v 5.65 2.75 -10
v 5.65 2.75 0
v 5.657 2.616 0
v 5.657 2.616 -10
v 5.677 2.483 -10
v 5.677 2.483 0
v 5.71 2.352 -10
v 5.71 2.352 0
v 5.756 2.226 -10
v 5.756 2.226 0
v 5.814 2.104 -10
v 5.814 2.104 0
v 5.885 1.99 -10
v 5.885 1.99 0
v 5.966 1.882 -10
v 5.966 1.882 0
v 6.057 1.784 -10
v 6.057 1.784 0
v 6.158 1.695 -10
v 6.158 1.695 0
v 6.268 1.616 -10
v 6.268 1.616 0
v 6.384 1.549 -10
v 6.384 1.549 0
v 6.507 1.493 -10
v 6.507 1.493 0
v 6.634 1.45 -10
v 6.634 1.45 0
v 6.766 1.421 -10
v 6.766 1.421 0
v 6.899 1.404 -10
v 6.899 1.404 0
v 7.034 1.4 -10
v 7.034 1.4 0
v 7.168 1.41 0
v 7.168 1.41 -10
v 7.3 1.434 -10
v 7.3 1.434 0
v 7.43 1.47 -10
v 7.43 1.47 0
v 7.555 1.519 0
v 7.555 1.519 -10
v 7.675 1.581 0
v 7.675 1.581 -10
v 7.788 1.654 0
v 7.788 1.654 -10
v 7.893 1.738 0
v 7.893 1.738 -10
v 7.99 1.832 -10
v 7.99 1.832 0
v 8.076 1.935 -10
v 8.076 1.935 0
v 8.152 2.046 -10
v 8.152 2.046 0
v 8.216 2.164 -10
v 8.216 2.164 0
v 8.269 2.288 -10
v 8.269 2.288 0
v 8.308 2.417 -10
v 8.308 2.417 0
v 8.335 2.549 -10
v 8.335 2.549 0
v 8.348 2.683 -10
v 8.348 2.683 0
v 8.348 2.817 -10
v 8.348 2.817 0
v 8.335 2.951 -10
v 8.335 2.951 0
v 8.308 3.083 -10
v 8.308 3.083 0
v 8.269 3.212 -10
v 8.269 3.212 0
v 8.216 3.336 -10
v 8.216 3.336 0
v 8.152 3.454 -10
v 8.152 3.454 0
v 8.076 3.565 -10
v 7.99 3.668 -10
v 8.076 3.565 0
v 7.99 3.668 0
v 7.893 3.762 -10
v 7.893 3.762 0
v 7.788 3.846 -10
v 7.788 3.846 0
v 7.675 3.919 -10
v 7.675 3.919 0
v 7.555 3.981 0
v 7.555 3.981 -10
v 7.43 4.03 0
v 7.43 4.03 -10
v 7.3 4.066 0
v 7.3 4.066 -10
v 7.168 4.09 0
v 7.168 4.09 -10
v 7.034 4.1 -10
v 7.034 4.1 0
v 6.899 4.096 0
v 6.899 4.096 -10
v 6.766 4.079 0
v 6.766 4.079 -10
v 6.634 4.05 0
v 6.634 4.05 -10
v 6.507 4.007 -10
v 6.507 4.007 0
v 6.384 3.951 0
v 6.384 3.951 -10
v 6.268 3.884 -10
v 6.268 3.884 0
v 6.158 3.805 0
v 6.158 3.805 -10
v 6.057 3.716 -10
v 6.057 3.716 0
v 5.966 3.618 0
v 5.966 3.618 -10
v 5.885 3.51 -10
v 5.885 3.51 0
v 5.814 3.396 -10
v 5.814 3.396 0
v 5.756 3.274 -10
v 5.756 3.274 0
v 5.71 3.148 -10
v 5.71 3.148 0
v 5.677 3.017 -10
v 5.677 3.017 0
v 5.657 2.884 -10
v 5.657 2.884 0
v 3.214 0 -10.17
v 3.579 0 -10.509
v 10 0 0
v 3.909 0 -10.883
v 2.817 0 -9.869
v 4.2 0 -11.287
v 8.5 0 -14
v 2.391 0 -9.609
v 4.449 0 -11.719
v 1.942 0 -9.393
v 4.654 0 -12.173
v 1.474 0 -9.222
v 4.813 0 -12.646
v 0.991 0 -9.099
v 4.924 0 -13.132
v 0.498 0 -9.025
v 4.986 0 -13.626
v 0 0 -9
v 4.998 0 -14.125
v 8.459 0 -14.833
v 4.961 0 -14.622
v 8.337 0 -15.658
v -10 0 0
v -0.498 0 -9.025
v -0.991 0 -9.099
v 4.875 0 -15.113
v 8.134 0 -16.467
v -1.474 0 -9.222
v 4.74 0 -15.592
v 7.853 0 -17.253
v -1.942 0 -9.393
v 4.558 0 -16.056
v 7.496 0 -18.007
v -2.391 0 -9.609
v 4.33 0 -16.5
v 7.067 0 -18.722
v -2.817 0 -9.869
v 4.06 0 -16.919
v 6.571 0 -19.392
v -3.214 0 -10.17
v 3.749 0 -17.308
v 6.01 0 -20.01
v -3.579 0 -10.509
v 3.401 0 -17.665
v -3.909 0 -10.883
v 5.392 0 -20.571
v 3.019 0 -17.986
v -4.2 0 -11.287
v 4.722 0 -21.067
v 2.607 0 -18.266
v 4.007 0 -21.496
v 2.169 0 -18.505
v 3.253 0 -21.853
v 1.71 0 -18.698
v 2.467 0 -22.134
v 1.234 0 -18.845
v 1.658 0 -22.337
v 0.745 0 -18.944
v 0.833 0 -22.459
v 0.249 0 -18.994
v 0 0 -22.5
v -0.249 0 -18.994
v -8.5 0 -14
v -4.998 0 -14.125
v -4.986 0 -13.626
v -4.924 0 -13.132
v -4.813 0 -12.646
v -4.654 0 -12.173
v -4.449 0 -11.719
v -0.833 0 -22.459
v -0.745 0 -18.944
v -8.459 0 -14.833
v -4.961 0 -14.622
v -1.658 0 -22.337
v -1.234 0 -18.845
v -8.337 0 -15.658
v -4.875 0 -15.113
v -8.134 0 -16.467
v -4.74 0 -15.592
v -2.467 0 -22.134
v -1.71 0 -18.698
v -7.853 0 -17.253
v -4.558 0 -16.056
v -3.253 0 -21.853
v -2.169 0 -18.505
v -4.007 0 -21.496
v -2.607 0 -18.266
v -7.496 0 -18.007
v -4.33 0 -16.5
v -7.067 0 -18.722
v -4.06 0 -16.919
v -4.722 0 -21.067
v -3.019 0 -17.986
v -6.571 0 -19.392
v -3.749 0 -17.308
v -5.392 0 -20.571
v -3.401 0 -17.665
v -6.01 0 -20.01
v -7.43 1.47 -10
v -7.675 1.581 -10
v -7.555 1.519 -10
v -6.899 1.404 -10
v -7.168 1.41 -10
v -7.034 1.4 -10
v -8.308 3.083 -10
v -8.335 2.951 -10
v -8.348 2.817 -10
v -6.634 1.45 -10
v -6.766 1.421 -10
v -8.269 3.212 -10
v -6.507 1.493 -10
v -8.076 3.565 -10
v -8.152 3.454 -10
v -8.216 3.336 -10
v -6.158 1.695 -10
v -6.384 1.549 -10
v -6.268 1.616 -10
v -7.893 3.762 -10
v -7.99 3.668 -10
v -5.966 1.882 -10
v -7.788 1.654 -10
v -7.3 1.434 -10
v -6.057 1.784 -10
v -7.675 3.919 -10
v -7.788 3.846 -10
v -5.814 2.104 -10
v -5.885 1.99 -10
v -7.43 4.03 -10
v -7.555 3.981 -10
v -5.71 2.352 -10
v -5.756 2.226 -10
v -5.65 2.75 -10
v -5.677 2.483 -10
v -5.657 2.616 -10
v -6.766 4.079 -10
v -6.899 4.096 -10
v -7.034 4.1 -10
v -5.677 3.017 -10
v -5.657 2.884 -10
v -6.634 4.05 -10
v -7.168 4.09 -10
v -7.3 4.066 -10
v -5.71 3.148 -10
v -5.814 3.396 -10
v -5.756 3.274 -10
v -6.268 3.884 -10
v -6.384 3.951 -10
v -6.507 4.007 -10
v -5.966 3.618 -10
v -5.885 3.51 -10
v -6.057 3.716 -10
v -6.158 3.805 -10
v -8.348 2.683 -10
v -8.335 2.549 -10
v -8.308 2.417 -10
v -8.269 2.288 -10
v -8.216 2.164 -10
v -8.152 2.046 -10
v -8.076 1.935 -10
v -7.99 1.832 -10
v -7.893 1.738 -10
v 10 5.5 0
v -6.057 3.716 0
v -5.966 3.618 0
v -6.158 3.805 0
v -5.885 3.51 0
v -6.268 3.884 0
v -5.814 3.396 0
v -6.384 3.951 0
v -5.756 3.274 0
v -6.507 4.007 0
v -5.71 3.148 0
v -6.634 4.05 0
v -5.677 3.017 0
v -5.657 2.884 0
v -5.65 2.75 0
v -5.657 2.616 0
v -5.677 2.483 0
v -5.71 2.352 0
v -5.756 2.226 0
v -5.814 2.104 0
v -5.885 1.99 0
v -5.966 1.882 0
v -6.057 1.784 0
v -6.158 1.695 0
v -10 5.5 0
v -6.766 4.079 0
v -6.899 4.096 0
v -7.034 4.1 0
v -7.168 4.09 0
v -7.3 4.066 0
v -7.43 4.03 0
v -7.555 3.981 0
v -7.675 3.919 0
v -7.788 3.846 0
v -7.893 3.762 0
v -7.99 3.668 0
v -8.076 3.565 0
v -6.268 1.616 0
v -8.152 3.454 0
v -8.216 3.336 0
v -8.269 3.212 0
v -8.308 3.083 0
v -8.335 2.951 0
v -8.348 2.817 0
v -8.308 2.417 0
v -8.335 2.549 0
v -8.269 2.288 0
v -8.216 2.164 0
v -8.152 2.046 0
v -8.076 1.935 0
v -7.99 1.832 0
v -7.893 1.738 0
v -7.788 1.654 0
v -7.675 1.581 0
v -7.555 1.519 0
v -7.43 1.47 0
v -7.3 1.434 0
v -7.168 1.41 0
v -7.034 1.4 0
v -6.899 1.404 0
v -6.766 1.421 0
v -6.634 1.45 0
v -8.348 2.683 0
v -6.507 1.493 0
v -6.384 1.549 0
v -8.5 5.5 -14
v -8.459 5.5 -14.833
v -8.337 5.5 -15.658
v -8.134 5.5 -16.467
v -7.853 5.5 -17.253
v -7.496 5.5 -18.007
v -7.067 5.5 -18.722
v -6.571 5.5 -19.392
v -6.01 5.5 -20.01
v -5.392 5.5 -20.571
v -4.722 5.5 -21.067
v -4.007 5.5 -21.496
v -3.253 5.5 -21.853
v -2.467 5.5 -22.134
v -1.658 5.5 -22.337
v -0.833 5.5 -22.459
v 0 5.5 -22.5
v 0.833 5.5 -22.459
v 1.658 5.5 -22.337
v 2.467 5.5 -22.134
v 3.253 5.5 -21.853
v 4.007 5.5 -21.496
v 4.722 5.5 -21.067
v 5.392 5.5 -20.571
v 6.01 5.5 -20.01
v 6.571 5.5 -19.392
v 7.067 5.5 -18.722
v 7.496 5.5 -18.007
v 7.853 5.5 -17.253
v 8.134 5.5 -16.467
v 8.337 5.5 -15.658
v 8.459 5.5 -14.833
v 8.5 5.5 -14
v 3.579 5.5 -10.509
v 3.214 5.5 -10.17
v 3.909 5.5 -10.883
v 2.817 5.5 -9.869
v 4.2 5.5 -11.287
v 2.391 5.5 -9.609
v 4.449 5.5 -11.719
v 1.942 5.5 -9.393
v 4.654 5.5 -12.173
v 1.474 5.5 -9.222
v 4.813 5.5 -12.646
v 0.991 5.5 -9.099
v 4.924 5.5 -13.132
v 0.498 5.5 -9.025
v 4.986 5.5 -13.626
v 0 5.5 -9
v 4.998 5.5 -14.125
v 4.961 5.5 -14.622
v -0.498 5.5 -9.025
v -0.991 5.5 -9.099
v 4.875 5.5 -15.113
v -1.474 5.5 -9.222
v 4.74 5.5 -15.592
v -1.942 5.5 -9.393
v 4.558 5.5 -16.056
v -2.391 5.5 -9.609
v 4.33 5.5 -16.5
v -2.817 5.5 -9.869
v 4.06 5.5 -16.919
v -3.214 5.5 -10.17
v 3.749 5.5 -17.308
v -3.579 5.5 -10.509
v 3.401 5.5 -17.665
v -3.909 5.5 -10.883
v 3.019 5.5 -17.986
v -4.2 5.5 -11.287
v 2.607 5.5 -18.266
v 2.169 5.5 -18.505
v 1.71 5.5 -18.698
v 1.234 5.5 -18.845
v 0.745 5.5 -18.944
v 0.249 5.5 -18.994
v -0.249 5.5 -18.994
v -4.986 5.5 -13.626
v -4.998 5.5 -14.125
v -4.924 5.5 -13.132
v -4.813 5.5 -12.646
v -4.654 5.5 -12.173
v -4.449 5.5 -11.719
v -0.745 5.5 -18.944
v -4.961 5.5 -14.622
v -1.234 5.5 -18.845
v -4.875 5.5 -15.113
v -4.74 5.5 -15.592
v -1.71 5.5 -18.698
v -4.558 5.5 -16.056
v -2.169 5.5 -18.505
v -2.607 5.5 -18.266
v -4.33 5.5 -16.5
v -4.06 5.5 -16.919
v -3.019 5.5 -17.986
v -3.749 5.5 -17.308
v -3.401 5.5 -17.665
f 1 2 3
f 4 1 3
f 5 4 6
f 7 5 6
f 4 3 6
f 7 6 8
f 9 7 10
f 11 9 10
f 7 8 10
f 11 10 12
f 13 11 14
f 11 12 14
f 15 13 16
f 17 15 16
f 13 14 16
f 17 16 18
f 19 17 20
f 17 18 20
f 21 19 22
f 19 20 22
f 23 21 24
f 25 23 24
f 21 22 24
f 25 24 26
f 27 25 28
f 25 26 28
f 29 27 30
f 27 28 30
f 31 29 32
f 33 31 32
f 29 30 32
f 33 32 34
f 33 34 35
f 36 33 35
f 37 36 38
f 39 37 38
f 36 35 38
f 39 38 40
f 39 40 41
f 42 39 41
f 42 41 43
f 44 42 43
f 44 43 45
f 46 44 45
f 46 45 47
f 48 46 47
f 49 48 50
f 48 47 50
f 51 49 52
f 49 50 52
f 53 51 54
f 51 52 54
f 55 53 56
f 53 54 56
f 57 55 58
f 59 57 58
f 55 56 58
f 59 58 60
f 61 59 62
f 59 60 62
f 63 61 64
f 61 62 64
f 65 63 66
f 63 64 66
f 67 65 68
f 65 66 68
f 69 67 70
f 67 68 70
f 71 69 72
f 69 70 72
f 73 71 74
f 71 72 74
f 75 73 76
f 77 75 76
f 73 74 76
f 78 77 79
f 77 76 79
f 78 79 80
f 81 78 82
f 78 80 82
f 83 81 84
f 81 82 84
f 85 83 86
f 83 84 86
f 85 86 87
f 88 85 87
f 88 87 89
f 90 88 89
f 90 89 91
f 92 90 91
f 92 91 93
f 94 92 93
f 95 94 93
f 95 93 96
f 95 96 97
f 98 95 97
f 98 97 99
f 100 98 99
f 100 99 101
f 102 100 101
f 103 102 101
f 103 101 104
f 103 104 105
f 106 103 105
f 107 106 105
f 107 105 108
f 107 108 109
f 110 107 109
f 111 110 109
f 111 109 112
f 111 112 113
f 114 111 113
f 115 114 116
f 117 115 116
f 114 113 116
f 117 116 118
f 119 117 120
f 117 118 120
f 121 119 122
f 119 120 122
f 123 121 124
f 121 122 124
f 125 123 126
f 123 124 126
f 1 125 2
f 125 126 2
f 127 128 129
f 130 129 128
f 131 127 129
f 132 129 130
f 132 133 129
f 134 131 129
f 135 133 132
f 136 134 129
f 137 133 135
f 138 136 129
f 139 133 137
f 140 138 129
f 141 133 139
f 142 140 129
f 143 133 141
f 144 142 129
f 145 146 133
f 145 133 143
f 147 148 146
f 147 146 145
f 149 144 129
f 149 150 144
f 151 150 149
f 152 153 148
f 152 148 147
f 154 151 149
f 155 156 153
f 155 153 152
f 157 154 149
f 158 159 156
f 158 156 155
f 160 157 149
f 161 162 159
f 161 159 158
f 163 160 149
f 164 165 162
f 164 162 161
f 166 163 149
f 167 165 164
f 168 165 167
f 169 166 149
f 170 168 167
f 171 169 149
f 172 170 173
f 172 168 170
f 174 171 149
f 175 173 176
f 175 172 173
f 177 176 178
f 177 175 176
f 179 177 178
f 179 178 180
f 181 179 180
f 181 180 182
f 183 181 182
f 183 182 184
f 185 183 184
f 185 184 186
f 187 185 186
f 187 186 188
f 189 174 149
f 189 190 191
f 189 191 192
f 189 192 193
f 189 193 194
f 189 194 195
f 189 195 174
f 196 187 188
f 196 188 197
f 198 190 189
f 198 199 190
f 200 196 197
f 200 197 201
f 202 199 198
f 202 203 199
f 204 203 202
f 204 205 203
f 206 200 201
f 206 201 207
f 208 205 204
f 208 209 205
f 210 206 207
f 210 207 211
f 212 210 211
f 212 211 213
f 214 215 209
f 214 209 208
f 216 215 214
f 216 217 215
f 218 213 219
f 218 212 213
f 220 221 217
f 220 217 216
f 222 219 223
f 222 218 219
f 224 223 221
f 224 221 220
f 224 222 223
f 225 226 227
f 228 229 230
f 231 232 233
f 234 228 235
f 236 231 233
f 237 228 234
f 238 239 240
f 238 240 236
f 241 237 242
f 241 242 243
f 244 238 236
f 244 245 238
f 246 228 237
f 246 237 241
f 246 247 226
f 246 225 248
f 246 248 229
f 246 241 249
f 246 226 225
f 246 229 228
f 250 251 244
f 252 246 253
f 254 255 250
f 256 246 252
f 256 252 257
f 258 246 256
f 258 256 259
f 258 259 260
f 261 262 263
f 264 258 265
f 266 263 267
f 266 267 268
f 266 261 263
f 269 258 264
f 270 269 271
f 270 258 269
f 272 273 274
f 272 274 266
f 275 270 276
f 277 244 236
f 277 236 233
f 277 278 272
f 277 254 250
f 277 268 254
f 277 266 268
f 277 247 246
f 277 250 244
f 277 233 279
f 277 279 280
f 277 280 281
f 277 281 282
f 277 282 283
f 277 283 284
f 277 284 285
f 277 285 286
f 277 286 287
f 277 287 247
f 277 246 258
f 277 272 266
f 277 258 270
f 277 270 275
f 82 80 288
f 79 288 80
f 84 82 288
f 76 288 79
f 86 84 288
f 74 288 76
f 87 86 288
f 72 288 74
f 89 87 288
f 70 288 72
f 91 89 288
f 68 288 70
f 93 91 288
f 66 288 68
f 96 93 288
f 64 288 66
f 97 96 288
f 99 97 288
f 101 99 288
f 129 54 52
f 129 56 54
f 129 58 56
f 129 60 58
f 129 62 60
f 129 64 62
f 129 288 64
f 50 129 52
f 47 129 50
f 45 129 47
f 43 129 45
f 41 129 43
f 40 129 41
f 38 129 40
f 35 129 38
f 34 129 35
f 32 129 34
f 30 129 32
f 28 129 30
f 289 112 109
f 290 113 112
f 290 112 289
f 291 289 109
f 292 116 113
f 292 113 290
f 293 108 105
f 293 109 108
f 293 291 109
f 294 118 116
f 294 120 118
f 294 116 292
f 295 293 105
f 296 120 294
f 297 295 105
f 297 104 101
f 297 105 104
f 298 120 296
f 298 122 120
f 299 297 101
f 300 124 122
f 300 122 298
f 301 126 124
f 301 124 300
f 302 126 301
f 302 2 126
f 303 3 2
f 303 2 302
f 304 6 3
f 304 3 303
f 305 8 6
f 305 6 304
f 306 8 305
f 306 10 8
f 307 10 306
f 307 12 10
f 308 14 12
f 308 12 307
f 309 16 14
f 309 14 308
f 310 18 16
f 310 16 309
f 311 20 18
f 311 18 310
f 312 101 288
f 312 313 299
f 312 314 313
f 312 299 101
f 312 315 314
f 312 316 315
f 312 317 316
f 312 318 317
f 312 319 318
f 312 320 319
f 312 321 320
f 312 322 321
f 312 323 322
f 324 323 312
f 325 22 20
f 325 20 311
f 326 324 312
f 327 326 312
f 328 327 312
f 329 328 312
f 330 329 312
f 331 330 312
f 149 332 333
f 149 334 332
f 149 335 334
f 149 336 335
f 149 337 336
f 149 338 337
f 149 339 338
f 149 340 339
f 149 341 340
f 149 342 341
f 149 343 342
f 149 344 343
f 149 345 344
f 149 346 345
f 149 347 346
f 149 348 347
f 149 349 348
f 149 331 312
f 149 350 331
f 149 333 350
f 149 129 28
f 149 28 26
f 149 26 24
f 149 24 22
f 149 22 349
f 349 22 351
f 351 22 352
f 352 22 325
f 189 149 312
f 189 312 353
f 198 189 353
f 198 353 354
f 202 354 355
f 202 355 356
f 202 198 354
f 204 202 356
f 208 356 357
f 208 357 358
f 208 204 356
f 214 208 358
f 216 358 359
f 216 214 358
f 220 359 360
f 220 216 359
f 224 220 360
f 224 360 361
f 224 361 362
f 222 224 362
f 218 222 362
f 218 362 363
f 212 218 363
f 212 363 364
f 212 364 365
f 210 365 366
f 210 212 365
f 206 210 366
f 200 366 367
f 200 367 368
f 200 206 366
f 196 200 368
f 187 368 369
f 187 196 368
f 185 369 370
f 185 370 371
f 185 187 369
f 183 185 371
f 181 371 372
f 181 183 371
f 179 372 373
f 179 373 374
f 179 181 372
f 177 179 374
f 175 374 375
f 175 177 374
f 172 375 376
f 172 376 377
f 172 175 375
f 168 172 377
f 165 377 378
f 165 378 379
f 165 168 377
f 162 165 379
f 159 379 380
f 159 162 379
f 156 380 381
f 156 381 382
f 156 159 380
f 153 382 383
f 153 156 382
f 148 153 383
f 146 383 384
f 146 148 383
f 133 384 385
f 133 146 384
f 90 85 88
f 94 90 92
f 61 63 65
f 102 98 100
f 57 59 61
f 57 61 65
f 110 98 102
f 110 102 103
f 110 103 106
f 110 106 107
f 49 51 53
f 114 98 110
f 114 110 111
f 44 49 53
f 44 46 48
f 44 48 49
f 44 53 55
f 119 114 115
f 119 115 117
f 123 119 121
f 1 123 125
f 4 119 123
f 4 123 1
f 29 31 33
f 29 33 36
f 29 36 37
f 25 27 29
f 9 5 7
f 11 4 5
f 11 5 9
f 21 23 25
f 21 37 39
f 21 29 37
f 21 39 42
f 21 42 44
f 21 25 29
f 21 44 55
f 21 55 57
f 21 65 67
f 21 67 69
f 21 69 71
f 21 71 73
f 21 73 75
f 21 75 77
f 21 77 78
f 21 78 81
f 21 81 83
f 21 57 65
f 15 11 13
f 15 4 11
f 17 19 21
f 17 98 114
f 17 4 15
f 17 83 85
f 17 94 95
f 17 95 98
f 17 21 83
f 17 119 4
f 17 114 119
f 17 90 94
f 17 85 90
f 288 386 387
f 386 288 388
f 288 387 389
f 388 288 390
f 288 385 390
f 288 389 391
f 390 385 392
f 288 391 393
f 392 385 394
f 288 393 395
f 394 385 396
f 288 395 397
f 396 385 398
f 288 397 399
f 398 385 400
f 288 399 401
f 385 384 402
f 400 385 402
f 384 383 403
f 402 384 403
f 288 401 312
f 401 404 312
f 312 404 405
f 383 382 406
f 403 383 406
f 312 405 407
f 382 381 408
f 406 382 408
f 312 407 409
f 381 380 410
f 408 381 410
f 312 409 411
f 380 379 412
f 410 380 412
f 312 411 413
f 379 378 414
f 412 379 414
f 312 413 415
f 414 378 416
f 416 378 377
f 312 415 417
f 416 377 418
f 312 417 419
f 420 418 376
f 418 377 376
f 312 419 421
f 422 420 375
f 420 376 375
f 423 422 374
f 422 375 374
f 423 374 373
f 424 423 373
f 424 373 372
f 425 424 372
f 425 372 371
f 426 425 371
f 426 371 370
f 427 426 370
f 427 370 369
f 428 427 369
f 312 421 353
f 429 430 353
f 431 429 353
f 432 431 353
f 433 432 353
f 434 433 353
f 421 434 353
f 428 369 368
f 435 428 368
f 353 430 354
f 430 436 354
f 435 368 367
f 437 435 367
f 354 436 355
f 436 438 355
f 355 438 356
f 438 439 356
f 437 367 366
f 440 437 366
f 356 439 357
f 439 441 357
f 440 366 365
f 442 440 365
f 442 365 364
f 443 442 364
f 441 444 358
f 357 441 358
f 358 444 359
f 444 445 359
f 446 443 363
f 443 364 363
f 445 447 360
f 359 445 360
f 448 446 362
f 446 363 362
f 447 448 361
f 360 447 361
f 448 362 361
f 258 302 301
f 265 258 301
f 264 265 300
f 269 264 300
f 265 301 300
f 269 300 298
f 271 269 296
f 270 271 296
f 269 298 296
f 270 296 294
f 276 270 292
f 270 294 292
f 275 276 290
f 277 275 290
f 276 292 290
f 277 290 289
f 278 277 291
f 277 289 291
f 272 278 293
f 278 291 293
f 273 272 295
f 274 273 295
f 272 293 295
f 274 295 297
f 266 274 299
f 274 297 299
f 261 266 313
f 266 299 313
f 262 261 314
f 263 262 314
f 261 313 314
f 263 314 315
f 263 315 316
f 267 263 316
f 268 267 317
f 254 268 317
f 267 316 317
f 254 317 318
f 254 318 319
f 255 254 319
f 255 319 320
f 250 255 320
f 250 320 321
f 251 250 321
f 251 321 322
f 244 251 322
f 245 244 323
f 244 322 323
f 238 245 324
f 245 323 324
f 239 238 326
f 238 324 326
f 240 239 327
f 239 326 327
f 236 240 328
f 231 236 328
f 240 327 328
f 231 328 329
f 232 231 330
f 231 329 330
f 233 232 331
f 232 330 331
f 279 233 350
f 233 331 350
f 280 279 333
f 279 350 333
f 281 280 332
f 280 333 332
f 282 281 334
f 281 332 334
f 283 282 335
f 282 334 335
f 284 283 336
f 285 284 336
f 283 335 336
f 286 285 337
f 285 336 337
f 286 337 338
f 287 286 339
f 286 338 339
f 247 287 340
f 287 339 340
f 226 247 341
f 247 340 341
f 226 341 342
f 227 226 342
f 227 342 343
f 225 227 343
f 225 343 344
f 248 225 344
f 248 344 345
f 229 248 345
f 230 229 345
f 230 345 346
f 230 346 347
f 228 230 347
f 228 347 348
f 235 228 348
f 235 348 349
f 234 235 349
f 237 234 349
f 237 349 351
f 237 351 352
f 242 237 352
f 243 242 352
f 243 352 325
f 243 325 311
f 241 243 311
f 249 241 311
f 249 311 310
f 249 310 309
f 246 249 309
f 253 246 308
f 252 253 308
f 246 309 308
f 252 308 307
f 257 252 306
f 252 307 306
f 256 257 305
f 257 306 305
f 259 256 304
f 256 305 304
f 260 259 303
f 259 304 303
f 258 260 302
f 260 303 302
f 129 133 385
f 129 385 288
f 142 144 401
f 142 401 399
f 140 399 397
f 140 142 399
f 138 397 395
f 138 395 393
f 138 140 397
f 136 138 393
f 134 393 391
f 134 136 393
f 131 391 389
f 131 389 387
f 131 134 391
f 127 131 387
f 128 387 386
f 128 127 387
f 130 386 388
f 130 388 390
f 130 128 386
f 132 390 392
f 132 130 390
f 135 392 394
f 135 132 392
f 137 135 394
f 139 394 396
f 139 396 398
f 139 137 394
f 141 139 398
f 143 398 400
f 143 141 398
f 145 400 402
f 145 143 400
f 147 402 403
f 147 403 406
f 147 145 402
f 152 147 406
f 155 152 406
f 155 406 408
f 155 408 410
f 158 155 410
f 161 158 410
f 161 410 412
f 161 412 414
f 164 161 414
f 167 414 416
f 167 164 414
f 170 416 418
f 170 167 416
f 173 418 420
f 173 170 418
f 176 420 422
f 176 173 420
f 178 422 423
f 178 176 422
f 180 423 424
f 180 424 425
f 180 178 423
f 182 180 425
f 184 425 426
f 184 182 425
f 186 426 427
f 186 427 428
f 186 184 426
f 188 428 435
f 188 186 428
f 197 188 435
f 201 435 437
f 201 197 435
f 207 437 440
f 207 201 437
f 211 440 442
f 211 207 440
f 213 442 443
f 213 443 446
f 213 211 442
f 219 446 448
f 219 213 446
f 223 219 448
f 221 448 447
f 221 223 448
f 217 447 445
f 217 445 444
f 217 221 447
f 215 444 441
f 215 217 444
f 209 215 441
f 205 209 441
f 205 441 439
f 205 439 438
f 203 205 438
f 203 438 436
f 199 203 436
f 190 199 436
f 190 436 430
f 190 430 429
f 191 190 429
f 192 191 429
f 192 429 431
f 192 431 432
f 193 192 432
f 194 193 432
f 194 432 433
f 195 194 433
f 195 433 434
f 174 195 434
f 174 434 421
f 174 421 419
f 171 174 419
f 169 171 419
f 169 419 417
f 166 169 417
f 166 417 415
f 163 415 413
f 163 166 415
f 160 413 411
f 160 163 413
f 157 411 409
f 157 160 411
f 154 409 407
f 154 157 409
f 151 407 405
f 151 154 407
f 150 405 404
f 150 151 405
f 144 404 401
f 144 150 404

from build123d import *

# Parameters (mm, degrees)
SKETCH1_R           = 5
BOSS_EXTRUDE1_DEPTH = 5.5
SKETCH2_R           = 1.35
CUT_EXTRUDE1_DEPTH  = 10


with BuildPart() as part:
    # Sketch1 → Boss-Extrude1 (new body)
    with BuildSketch(Plane(origin=(0, 0, 0), x_dir=(1, 0, 0), z_dir=(0, 1, 0))):
        with BuildLine():
            Line((-10, 0), (-8.5, 14))
            ThreePointArc((-8.5, 14), (0, 22.5), (8.5, 14))
            Line((8.5, 14), (10, 0))
            Line((10, 0), (-10, 0))
        make_face()
        with Locations(Location((0, 14, 0), (0, 0, 270))):
            Circle(SKETCH1_R, mode=Mode.SUBTRACT)
    extrude(amount=BOSS_EXTRUDE1_DEPTH)

    # Sketch2 → Cut-Extrude1 (cut)
    with BuildSketch(Plane.XY):
        with Locations((-7, 2.75)):
            Circle(SKETCH2_R)
        with Locations(Location((7, 2.75, 0), (0, 0, 180))):
            Circle(SKETCH2_R)
    extrude(amount=-CUT_EXTRUDE1_DEPTH, mode=Mode.SUBTRACT)


solid = part.part
